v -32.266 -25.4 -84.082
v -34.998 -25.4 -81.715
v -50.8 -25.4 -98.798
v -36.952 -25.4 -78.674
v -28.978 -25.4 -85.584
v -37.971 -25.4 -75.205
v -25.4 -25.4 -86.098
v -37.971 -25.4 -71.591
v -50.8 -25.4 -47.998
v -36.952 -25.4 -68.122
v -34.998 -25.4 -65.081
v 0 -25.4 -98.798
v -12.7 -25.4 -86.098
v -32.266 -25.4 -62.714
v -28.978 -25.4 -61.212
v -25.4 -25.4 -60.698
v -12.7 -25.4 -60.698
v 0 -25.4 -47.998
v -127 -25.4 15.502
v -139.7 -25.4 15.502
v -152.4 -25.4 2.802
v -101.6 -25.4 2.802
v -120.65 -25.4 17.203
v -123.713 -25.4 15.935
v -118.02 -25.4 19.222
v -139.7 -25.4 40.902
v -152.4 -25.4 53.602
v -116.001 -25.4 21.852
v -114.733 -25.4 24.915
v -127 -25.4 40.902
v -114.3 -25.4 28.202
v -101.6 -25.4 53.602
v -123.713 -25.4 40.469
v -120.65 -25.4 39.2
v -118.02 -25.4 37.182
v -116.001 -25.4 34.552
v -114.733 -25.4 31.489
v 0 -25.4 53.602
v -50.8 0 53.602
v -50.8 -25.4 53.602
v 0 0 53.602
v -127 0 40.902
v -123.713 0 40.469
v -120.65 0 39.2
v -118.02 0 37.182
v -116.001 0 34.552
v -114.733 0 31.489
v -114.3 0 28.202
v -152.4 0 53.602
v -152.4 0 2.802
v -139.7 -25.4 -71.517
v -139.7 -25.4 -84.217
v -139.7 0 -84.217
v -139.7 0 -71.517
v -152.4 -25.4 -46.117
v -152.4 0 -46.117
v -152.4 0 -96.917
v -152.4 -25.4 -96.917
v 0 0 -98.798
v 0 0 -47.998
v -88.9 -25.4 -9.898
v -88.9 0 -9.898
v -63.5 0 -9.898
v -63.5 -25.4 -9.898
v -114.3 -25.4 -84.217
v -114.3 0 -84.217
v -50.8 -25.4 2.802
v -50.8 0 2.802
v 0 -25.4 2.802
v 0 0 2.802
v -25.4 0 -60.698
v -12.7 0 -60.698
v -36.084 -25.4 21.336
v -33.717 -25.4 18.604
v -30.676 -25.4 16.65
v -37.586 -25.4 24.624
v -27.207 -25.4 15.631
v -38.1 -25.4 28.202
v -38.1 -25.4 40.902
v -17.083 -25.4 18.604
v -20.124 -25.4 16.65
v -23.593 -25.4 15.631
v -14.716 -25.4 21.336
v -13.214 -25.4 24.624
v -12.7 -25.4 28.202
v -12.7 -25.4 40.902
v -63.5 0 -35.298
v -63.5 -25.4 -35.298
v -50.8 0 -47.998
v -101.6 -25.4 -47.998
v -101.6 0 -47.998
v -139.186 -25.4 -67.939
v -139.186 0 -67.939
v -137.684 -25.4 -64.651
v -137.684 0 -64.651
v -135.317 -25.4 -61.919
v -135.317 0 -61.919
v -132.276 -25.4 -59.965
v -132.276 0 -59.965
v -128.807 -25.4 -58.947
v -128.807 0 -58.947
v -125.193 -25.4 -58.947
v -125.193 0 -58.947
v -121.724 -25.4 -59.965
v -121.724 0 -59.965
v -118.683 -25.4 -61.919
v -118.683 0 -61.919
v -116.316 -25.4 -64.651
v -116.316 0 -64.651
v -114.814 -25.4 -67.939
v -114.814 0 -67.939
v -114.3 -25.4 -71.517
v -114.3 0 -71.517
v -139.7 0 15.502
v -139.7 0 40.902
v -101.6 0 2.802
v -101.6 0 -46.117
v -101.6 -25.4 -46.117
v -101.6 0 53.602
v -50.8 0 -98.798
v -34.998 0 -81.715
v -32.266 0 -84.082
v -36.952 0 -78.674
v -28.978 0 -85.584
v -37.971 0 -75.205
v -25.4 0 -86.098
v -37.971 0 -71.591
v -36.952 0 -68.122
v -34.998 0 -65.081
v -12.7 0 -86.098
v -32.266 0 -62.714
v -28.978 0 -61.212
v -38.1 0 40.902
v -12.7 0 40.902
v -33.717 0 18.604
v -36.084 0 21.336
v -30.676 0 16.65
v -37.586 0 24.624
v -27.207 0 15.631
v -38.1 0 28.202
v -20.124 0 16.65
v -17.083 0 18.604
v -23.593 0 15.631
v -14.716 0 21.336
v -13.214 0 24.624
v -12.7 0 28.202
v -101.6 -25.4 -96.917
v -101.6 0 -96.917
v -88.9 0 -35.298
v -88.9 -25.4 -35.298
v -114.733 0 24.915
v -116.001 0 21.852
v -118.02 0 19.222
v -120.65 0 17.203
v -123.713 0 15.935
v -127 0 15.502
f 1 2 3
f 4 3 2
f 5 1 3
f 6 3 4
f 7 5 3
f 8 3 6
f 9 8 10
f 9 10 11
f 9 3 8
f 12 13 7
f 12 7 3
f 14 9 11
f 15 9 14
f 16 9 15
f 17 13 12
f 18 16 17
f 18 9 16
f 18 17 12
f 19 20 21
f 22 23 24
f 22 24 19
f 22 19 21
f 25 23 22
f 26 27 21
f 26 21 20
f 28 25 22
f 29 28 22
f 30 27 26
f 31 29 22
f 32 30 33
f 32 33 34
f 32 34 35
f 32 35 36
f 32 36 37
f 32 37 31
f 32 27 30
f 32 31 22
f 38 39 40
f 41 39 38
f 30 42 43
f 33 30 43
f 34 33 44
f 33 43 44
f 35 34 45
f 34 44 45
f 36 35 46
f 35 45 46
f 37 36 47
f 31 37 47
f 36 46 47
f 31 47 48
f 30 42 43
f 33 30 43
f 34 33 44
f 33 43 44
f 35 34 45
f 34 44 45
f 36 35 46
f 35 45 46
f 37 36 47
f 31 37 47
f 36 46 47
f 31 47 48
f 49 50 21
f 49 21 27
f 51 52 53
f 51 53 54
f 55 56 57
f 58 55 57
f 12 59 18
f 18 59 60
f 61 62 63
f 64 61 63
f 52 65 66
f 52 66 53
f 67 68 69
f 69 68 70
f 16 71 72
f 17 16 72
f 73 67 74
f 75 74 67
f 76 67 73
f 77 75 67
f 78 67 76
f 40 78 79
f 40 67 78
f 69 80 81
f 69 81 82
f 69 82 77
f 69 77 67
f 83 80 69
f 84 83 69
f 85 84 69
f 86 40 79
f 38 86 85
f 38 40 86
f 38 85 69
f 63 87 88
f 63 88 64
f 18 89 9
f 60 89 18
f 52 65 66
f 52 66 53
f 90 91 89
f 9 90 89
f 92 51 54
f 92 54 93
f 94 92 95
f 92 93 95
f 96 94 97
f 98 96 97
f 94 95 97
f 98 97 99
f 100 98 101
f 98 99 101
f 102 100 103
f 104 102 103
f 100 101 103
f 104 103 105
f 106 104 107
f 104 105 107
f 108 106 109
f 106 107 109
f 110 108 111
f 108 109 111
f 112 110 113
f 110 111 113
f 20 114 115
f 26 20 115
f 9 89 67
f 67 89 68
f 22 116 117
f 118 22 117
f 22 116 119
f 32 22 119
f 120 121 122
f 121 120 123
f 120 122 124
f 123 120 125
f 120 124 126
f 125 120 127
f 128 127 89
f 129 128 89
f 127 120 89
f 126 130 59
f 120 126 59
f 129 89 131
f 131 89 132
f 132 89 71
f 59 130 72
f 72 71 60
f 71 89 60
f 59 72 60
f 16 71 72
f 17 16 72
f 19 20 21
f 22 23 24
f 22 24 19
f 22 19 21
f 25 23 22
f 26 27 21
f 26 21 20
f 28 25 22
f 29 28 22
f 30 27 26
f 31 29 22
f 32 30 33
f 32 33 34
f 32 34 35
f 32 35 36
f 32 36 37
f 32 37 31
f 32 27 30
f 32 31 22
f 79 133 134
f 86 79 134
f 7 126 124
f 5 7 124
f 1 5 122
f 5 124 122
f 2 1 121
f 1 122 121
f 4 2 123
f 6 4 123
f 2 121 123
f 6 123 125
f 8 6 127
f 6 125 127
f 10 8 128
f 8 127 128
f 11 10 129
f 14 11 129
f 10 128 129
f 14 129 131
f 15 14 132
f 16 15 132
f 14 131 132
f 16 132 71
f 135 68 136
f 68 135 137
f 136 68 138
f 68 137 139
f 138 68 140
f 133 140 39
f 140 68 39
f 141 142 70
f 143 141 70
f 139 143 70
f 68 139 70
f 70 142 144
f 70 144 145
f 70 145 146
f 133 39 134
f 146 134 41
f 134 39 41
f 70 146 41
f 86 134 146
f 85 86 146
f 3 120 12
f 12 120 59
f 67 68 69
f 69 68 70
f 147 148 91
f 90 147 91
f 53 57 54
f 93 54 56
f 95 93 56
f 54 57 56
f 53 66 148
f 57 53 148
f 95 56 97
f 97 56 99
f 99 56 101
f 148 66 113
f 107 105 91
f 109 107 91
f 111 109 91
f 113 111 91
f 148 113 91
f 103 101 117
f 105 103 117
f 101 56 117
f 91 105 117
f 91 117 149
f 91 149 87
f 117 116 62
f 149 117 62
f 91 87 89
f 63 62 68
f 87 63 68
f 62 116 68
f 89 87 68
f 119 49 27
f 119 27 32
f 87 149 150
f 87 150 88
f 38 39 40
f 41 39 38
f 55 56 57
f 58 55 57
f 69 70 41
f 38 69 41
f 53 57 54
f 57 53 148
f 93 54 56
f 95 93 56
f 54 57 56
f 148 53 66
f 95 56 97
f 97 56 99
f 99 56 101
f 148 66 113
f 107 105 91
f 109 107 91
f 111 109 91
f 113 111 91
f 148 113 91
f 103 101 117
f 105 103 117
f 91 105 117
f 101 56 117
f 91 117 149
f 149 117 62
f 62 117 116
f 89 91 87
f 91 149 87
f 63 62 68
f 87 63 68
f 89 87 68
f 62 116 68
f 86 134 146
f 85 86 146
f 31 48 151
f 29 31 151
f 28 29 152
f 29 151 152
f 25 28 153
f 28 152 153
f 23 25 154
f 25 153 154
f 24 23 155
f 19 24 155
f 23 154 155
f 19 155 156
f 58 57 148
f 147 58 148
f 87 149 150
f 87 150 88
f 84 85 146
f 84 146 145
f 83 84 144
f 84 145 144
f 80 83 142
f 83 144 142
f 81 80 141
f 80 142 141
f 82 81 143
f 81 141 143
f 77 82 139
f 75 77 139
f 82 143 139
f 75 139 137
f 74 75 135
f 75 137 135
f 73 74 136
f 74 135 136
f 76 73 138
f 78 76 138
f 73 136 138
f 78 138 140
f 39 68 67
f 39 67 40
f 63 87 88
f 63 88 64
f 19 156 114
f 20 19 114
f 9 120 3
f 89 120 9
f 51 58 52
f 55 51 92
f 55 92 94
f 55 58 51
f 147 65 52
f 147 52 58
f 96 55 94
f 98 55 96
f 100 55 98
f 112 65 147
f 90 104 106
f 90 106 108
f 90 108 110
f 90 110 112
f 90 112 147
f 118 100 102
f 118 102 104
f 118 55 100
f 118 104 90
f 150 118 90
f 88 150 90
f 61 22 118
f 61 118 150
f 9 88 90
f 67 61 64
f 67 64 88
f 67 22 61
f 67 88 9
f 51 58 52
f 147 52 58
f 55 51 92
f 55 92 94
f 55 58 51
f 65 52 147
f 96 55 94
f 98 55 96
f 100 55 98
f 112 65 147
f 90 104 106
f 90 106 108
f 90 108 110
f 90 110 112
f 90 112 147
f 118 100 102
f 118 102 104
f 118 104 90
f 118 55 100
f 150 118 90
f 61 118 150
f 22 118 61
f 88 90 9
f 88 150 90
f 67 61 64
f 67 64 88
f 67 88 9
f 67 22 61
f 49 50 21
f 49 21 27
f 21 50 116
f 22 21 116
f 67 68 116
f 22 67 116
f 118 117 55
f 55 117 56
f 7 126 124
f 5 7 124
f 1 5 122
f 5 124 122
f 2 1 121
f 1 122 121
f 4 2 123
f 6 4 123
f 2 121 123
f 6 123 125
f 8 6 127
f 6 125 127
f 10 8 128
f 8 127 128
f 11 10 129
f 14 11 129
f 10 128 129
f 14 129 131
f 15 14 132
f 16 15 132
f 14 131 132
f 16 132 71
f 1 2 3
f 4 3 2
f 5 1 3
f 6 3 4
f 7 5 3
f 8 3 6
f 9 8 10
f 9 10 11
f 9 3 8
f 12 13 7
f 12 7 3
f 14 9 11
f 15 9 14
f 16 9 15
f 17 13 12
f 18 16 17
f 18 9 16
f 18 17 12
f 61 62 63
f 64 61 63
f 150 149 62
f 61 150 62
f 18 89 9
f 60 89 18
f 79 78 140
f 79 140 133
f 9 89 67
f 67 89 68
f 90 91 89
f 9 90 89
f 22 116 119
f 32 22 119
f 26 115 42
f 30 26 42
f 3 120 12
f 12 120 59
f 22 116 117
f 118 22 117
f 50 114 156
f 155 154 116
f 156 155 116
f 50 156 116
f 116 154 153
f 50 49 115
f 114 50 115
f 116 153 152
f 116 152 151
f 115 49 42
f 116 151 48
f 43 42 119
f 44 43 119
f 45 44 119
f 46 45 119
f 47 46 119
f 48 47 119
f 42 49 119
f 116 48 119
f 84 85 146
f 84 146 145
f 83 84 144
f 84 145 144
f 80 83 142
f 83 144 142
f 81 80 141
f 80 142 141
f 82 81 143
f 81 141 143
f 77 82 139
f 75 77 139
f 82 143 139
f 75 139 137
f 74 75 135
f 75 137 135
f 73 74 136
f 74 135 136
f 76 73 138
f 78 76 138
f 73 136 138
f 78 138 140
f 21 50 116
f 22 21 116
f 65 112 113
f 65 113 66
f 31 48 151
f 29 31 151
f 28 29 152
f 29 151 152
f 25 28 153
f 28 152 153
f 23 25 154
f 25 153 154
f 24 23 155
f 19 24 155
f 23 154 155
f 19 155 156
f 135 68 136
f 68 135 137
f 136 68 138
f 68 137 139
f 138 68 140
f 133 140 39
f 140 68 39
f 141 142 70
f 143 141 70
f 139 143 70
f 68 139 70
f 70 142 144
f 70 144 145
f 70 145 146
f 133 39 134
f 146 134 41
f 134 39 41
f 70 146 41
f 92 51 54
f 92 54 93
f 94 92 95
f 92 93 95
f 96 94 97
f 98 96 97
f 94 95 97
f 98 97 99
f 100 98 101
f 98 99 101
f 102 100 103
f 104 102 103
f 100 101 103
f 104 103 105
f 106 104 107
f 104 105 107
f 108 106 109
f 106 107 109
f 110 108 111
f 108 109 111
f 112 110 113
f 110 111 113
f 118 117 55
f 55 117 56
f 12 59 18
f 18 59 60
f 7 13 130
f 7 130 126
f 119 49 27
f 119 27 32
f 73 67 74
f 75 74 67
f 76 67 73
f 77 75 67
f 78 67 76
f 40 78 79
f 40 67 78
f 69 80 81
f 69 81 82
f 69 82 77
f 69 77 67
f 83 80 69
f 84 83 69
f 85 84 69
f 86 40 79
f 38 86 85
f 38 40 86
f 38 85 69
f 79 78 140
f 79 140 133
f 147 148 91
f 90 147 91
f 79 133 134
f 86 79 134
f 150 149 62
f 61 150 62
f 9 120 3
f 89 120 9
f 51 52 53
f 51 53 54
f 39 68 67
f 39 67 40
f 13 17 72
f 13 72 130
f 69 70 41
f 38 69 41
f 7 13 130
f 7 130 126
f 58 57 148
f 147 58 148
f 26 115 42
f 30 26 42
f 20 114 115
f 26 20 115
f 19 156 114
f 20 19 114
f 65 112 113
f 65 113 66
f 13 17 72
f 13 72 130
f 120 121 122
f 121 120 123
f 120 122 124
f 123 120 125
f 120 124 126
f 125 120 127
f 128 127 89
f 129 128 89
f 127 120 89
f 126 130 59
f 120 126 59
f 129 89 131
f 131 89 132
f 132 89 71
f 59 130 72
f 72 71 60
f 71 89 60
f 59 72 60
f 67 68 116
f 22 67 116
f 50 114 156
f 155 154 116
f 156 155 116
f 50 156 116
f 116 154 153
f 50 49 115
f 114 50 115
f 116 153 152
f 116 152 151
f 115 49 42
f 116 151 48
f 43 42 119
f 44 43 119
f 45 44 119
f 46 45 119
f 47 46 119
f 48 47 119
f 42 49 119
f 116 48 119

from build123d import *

# Parameters (mm, degrees)
F0_W     = 50.8
F0_H     = 50.8
F0_W_2   = 25.4
F0_H_2   = 25.4
F1_DEPTH = 25.4
F2_DEPTH = 25.4


with BuildPart() as f1:
    # F0 (on Front) → F1 (new body)
    with BuildSketch(Plane.XZ):
        with Locations((-25.4, 28.201944)):
            Rectangle(F0_W, F0_H)
        with BuildLine():
            Line((-25.4, 40.901944), (-12.7, 40.901944))
            Line((-12.7, 40.901944), (-12.7, 28.201944))
            ThreePointArc((-12.7, 28.201944), (-25.4, 15.501944), (-38.1, 28.201944))
            Line((-38.1, 28.201944), (-38.1, 40.901944))
            Line((-38.1, 40.901944), (-25.4, 40.901944))
        make_face(mode=Mode.SUBTRACT)
        with Locations((-25.4, -73.398056)):
            Rectangle(F0_W, F0_H)
        with BuildLine():
            Line((-25.4, -60.698056), (-12.7, -60.698056))
            Line((-12.7, -60.698056), (-12.7, -73.398056))
            Line((-12.7, -73.398056), (-12.7, -86.098056))
            Line((-12.7, -86.098056), (-25.4, -86.098056))
            ThreePointArc((-25.4, -86.098056), (-38.1, -73.398056), (-25.4, -60.698056))
        make_face(mode=Mode.SUBTRACT)
        with Locations((-127, 28.201944)):
            Rectangle(F0_W, F0_H)
        with BuildLine():
            Line((-139.7, 40.901944), (-127, 40.901944))
            ThreePointArc((-127, 40.901944), (-118.019744, 37.1822), (-114.3, 28.201944))
            ThreePointArc((-114.3, 28.201944), (-118.019744, 19.221688), (-127, 15.501944))
            Line((-127, 15.501944), (-139.7, 15.501944))
            Line((-139.7, 15.501944), (-139.7, 28.201944))
            Line((-139.7, 28.201944), (-139.7, 40.901944))
        make_face(mode=Mode.SUBTRACT)
        Polygon((-101.6, -47.998056), (-101.6, -46.11724), (-152.4, -46.11724), (-152.4, -96.91724), (-101.6, -96.91724), align=None)
        with BuildLine():
            Line((-114.3, -71.51724), (-114.3, -84.21724))
            Line((-114.3, -84.21724), (-127, -84.21724))
            Line((-127, -84.21724), (-139.7, -84.21724))
            Line((-139.7, -84.21724), (-139.7, -71.51724))
            ThreePointArc((-139.7, -71.51724), (-127, -58.81724), (-114.3, -71.51724))
        make_face(mode=Mode.SUBTRACT)
        Polygon((-50.8, -47.998056), (-50.8, 2.801944), (-101.6, 2.801944), (-101.6, -46.11724), (-101.6, -47.998056), align=None)
        with Locations((-76.2, -22.598056)):
            Rectangle(F0_W_2, F0_H_2, mode=Mode.SUBTRACT)
    extrude(amount=F1_DEPTH)


with BuildPart() as f2:
    # F0 (on Front) → F2 (new body)
    with BuildSketch(Plane.XZ):
        with Locations((-25.4, 28.201944)):
            Rectangle(F0_W, F0_H)
        with BuildLine():
            Line((-25.4, 40.901944), (-12.7, 40.901944))
            Line((-12.7, 40.901944), (-12.7, 28.201944))
            ThreePointArc((-12.7, 28.201944), (-25.4, 15.501944), (-38.1, 28.201944))
            Line((-38.1, 28.201944), (-38.1, 40.901944))
            Line((-38.1, 40.901944), (-25.4, 40.901944))
        make_face(mode=Mode.SUBTRACT)
        Polygon((-50.8, -47.998056), (-50.8, 2.801944), (-101.6, 2.801944), (-101.6, -46.11724), (-101.6, -47.998056), align=None)
        with Locations((-76.2, -22.598056)):
            Rectangle(F0_W_2, F0_H_2, mode=Mode.SUBTRACT)
        with Locations((-25.4, -73.398056)):
            Rectangle(F0_W, F0_H)
        with BuildLine():
            Line((-25.4, -60.698056), (-12.7, -60.698056))
            Line((-12.7, -60.698056), (-12.7, -73.398056))
            Line((-12.7, -73.398056), (-12.7, -86.098056))
            Line((-12.7, -86.098056), (-25.4, -86.098056))
            ThreePointArc((-25.4, -86.098056), (-38.1, -73.398056), (-25.4, -60.698056))
        make_face(mode=Mode.SUBTRACT)
        with Locations((-127, 28.201944)):
            Rectangle(F0_W, F0_H)
        with BuildLine():
            Line((-139.7, 40.901944), (-127, 40.901944))
            ThreePointArc((-127, 40.901944), (-118.019744, 37.1822), (-114.3, 28.201944))
            ThreePointArc((-114.3, 28.201944), (-118.019744, 19.221688), (-127, 15.501944))
            Line((-127, 15.501944), (-139.7, 15.501944))
            Line((-139.7, 15.501944), (-139.7, 28.201944))
            Line((-139.7, 28.201944), (-139.7, 40.901944))
        make_face(mode=Mode.SUBTRACT)
        Polygon((-101.6, -47.998056), (-101.6, -46.11724), (-152.4, -46.11724), (-152.4, -96.91724), (-101.6, -96.91724), align=None)
        with BuildLine():
            Line((-114.3, -71.51724), (-114.3, -84.21724))
            Line((-114.3, -84.21724), (-127, -84.21724))
            Line((-127, -84.21724), (-139.7, -84.21724))
            Line((-139.7, -84.21724), (-139.7, -71.51724))
            ThreePointArc((-139.7, -71.51724), (-127, -58.81724), (-114.3, -71.51724))
        make_face(mode=Mode.SUBTRACT)
    extrude(amount=F2_DEPTH)


solid = Compound([f1.part, f2.part])
